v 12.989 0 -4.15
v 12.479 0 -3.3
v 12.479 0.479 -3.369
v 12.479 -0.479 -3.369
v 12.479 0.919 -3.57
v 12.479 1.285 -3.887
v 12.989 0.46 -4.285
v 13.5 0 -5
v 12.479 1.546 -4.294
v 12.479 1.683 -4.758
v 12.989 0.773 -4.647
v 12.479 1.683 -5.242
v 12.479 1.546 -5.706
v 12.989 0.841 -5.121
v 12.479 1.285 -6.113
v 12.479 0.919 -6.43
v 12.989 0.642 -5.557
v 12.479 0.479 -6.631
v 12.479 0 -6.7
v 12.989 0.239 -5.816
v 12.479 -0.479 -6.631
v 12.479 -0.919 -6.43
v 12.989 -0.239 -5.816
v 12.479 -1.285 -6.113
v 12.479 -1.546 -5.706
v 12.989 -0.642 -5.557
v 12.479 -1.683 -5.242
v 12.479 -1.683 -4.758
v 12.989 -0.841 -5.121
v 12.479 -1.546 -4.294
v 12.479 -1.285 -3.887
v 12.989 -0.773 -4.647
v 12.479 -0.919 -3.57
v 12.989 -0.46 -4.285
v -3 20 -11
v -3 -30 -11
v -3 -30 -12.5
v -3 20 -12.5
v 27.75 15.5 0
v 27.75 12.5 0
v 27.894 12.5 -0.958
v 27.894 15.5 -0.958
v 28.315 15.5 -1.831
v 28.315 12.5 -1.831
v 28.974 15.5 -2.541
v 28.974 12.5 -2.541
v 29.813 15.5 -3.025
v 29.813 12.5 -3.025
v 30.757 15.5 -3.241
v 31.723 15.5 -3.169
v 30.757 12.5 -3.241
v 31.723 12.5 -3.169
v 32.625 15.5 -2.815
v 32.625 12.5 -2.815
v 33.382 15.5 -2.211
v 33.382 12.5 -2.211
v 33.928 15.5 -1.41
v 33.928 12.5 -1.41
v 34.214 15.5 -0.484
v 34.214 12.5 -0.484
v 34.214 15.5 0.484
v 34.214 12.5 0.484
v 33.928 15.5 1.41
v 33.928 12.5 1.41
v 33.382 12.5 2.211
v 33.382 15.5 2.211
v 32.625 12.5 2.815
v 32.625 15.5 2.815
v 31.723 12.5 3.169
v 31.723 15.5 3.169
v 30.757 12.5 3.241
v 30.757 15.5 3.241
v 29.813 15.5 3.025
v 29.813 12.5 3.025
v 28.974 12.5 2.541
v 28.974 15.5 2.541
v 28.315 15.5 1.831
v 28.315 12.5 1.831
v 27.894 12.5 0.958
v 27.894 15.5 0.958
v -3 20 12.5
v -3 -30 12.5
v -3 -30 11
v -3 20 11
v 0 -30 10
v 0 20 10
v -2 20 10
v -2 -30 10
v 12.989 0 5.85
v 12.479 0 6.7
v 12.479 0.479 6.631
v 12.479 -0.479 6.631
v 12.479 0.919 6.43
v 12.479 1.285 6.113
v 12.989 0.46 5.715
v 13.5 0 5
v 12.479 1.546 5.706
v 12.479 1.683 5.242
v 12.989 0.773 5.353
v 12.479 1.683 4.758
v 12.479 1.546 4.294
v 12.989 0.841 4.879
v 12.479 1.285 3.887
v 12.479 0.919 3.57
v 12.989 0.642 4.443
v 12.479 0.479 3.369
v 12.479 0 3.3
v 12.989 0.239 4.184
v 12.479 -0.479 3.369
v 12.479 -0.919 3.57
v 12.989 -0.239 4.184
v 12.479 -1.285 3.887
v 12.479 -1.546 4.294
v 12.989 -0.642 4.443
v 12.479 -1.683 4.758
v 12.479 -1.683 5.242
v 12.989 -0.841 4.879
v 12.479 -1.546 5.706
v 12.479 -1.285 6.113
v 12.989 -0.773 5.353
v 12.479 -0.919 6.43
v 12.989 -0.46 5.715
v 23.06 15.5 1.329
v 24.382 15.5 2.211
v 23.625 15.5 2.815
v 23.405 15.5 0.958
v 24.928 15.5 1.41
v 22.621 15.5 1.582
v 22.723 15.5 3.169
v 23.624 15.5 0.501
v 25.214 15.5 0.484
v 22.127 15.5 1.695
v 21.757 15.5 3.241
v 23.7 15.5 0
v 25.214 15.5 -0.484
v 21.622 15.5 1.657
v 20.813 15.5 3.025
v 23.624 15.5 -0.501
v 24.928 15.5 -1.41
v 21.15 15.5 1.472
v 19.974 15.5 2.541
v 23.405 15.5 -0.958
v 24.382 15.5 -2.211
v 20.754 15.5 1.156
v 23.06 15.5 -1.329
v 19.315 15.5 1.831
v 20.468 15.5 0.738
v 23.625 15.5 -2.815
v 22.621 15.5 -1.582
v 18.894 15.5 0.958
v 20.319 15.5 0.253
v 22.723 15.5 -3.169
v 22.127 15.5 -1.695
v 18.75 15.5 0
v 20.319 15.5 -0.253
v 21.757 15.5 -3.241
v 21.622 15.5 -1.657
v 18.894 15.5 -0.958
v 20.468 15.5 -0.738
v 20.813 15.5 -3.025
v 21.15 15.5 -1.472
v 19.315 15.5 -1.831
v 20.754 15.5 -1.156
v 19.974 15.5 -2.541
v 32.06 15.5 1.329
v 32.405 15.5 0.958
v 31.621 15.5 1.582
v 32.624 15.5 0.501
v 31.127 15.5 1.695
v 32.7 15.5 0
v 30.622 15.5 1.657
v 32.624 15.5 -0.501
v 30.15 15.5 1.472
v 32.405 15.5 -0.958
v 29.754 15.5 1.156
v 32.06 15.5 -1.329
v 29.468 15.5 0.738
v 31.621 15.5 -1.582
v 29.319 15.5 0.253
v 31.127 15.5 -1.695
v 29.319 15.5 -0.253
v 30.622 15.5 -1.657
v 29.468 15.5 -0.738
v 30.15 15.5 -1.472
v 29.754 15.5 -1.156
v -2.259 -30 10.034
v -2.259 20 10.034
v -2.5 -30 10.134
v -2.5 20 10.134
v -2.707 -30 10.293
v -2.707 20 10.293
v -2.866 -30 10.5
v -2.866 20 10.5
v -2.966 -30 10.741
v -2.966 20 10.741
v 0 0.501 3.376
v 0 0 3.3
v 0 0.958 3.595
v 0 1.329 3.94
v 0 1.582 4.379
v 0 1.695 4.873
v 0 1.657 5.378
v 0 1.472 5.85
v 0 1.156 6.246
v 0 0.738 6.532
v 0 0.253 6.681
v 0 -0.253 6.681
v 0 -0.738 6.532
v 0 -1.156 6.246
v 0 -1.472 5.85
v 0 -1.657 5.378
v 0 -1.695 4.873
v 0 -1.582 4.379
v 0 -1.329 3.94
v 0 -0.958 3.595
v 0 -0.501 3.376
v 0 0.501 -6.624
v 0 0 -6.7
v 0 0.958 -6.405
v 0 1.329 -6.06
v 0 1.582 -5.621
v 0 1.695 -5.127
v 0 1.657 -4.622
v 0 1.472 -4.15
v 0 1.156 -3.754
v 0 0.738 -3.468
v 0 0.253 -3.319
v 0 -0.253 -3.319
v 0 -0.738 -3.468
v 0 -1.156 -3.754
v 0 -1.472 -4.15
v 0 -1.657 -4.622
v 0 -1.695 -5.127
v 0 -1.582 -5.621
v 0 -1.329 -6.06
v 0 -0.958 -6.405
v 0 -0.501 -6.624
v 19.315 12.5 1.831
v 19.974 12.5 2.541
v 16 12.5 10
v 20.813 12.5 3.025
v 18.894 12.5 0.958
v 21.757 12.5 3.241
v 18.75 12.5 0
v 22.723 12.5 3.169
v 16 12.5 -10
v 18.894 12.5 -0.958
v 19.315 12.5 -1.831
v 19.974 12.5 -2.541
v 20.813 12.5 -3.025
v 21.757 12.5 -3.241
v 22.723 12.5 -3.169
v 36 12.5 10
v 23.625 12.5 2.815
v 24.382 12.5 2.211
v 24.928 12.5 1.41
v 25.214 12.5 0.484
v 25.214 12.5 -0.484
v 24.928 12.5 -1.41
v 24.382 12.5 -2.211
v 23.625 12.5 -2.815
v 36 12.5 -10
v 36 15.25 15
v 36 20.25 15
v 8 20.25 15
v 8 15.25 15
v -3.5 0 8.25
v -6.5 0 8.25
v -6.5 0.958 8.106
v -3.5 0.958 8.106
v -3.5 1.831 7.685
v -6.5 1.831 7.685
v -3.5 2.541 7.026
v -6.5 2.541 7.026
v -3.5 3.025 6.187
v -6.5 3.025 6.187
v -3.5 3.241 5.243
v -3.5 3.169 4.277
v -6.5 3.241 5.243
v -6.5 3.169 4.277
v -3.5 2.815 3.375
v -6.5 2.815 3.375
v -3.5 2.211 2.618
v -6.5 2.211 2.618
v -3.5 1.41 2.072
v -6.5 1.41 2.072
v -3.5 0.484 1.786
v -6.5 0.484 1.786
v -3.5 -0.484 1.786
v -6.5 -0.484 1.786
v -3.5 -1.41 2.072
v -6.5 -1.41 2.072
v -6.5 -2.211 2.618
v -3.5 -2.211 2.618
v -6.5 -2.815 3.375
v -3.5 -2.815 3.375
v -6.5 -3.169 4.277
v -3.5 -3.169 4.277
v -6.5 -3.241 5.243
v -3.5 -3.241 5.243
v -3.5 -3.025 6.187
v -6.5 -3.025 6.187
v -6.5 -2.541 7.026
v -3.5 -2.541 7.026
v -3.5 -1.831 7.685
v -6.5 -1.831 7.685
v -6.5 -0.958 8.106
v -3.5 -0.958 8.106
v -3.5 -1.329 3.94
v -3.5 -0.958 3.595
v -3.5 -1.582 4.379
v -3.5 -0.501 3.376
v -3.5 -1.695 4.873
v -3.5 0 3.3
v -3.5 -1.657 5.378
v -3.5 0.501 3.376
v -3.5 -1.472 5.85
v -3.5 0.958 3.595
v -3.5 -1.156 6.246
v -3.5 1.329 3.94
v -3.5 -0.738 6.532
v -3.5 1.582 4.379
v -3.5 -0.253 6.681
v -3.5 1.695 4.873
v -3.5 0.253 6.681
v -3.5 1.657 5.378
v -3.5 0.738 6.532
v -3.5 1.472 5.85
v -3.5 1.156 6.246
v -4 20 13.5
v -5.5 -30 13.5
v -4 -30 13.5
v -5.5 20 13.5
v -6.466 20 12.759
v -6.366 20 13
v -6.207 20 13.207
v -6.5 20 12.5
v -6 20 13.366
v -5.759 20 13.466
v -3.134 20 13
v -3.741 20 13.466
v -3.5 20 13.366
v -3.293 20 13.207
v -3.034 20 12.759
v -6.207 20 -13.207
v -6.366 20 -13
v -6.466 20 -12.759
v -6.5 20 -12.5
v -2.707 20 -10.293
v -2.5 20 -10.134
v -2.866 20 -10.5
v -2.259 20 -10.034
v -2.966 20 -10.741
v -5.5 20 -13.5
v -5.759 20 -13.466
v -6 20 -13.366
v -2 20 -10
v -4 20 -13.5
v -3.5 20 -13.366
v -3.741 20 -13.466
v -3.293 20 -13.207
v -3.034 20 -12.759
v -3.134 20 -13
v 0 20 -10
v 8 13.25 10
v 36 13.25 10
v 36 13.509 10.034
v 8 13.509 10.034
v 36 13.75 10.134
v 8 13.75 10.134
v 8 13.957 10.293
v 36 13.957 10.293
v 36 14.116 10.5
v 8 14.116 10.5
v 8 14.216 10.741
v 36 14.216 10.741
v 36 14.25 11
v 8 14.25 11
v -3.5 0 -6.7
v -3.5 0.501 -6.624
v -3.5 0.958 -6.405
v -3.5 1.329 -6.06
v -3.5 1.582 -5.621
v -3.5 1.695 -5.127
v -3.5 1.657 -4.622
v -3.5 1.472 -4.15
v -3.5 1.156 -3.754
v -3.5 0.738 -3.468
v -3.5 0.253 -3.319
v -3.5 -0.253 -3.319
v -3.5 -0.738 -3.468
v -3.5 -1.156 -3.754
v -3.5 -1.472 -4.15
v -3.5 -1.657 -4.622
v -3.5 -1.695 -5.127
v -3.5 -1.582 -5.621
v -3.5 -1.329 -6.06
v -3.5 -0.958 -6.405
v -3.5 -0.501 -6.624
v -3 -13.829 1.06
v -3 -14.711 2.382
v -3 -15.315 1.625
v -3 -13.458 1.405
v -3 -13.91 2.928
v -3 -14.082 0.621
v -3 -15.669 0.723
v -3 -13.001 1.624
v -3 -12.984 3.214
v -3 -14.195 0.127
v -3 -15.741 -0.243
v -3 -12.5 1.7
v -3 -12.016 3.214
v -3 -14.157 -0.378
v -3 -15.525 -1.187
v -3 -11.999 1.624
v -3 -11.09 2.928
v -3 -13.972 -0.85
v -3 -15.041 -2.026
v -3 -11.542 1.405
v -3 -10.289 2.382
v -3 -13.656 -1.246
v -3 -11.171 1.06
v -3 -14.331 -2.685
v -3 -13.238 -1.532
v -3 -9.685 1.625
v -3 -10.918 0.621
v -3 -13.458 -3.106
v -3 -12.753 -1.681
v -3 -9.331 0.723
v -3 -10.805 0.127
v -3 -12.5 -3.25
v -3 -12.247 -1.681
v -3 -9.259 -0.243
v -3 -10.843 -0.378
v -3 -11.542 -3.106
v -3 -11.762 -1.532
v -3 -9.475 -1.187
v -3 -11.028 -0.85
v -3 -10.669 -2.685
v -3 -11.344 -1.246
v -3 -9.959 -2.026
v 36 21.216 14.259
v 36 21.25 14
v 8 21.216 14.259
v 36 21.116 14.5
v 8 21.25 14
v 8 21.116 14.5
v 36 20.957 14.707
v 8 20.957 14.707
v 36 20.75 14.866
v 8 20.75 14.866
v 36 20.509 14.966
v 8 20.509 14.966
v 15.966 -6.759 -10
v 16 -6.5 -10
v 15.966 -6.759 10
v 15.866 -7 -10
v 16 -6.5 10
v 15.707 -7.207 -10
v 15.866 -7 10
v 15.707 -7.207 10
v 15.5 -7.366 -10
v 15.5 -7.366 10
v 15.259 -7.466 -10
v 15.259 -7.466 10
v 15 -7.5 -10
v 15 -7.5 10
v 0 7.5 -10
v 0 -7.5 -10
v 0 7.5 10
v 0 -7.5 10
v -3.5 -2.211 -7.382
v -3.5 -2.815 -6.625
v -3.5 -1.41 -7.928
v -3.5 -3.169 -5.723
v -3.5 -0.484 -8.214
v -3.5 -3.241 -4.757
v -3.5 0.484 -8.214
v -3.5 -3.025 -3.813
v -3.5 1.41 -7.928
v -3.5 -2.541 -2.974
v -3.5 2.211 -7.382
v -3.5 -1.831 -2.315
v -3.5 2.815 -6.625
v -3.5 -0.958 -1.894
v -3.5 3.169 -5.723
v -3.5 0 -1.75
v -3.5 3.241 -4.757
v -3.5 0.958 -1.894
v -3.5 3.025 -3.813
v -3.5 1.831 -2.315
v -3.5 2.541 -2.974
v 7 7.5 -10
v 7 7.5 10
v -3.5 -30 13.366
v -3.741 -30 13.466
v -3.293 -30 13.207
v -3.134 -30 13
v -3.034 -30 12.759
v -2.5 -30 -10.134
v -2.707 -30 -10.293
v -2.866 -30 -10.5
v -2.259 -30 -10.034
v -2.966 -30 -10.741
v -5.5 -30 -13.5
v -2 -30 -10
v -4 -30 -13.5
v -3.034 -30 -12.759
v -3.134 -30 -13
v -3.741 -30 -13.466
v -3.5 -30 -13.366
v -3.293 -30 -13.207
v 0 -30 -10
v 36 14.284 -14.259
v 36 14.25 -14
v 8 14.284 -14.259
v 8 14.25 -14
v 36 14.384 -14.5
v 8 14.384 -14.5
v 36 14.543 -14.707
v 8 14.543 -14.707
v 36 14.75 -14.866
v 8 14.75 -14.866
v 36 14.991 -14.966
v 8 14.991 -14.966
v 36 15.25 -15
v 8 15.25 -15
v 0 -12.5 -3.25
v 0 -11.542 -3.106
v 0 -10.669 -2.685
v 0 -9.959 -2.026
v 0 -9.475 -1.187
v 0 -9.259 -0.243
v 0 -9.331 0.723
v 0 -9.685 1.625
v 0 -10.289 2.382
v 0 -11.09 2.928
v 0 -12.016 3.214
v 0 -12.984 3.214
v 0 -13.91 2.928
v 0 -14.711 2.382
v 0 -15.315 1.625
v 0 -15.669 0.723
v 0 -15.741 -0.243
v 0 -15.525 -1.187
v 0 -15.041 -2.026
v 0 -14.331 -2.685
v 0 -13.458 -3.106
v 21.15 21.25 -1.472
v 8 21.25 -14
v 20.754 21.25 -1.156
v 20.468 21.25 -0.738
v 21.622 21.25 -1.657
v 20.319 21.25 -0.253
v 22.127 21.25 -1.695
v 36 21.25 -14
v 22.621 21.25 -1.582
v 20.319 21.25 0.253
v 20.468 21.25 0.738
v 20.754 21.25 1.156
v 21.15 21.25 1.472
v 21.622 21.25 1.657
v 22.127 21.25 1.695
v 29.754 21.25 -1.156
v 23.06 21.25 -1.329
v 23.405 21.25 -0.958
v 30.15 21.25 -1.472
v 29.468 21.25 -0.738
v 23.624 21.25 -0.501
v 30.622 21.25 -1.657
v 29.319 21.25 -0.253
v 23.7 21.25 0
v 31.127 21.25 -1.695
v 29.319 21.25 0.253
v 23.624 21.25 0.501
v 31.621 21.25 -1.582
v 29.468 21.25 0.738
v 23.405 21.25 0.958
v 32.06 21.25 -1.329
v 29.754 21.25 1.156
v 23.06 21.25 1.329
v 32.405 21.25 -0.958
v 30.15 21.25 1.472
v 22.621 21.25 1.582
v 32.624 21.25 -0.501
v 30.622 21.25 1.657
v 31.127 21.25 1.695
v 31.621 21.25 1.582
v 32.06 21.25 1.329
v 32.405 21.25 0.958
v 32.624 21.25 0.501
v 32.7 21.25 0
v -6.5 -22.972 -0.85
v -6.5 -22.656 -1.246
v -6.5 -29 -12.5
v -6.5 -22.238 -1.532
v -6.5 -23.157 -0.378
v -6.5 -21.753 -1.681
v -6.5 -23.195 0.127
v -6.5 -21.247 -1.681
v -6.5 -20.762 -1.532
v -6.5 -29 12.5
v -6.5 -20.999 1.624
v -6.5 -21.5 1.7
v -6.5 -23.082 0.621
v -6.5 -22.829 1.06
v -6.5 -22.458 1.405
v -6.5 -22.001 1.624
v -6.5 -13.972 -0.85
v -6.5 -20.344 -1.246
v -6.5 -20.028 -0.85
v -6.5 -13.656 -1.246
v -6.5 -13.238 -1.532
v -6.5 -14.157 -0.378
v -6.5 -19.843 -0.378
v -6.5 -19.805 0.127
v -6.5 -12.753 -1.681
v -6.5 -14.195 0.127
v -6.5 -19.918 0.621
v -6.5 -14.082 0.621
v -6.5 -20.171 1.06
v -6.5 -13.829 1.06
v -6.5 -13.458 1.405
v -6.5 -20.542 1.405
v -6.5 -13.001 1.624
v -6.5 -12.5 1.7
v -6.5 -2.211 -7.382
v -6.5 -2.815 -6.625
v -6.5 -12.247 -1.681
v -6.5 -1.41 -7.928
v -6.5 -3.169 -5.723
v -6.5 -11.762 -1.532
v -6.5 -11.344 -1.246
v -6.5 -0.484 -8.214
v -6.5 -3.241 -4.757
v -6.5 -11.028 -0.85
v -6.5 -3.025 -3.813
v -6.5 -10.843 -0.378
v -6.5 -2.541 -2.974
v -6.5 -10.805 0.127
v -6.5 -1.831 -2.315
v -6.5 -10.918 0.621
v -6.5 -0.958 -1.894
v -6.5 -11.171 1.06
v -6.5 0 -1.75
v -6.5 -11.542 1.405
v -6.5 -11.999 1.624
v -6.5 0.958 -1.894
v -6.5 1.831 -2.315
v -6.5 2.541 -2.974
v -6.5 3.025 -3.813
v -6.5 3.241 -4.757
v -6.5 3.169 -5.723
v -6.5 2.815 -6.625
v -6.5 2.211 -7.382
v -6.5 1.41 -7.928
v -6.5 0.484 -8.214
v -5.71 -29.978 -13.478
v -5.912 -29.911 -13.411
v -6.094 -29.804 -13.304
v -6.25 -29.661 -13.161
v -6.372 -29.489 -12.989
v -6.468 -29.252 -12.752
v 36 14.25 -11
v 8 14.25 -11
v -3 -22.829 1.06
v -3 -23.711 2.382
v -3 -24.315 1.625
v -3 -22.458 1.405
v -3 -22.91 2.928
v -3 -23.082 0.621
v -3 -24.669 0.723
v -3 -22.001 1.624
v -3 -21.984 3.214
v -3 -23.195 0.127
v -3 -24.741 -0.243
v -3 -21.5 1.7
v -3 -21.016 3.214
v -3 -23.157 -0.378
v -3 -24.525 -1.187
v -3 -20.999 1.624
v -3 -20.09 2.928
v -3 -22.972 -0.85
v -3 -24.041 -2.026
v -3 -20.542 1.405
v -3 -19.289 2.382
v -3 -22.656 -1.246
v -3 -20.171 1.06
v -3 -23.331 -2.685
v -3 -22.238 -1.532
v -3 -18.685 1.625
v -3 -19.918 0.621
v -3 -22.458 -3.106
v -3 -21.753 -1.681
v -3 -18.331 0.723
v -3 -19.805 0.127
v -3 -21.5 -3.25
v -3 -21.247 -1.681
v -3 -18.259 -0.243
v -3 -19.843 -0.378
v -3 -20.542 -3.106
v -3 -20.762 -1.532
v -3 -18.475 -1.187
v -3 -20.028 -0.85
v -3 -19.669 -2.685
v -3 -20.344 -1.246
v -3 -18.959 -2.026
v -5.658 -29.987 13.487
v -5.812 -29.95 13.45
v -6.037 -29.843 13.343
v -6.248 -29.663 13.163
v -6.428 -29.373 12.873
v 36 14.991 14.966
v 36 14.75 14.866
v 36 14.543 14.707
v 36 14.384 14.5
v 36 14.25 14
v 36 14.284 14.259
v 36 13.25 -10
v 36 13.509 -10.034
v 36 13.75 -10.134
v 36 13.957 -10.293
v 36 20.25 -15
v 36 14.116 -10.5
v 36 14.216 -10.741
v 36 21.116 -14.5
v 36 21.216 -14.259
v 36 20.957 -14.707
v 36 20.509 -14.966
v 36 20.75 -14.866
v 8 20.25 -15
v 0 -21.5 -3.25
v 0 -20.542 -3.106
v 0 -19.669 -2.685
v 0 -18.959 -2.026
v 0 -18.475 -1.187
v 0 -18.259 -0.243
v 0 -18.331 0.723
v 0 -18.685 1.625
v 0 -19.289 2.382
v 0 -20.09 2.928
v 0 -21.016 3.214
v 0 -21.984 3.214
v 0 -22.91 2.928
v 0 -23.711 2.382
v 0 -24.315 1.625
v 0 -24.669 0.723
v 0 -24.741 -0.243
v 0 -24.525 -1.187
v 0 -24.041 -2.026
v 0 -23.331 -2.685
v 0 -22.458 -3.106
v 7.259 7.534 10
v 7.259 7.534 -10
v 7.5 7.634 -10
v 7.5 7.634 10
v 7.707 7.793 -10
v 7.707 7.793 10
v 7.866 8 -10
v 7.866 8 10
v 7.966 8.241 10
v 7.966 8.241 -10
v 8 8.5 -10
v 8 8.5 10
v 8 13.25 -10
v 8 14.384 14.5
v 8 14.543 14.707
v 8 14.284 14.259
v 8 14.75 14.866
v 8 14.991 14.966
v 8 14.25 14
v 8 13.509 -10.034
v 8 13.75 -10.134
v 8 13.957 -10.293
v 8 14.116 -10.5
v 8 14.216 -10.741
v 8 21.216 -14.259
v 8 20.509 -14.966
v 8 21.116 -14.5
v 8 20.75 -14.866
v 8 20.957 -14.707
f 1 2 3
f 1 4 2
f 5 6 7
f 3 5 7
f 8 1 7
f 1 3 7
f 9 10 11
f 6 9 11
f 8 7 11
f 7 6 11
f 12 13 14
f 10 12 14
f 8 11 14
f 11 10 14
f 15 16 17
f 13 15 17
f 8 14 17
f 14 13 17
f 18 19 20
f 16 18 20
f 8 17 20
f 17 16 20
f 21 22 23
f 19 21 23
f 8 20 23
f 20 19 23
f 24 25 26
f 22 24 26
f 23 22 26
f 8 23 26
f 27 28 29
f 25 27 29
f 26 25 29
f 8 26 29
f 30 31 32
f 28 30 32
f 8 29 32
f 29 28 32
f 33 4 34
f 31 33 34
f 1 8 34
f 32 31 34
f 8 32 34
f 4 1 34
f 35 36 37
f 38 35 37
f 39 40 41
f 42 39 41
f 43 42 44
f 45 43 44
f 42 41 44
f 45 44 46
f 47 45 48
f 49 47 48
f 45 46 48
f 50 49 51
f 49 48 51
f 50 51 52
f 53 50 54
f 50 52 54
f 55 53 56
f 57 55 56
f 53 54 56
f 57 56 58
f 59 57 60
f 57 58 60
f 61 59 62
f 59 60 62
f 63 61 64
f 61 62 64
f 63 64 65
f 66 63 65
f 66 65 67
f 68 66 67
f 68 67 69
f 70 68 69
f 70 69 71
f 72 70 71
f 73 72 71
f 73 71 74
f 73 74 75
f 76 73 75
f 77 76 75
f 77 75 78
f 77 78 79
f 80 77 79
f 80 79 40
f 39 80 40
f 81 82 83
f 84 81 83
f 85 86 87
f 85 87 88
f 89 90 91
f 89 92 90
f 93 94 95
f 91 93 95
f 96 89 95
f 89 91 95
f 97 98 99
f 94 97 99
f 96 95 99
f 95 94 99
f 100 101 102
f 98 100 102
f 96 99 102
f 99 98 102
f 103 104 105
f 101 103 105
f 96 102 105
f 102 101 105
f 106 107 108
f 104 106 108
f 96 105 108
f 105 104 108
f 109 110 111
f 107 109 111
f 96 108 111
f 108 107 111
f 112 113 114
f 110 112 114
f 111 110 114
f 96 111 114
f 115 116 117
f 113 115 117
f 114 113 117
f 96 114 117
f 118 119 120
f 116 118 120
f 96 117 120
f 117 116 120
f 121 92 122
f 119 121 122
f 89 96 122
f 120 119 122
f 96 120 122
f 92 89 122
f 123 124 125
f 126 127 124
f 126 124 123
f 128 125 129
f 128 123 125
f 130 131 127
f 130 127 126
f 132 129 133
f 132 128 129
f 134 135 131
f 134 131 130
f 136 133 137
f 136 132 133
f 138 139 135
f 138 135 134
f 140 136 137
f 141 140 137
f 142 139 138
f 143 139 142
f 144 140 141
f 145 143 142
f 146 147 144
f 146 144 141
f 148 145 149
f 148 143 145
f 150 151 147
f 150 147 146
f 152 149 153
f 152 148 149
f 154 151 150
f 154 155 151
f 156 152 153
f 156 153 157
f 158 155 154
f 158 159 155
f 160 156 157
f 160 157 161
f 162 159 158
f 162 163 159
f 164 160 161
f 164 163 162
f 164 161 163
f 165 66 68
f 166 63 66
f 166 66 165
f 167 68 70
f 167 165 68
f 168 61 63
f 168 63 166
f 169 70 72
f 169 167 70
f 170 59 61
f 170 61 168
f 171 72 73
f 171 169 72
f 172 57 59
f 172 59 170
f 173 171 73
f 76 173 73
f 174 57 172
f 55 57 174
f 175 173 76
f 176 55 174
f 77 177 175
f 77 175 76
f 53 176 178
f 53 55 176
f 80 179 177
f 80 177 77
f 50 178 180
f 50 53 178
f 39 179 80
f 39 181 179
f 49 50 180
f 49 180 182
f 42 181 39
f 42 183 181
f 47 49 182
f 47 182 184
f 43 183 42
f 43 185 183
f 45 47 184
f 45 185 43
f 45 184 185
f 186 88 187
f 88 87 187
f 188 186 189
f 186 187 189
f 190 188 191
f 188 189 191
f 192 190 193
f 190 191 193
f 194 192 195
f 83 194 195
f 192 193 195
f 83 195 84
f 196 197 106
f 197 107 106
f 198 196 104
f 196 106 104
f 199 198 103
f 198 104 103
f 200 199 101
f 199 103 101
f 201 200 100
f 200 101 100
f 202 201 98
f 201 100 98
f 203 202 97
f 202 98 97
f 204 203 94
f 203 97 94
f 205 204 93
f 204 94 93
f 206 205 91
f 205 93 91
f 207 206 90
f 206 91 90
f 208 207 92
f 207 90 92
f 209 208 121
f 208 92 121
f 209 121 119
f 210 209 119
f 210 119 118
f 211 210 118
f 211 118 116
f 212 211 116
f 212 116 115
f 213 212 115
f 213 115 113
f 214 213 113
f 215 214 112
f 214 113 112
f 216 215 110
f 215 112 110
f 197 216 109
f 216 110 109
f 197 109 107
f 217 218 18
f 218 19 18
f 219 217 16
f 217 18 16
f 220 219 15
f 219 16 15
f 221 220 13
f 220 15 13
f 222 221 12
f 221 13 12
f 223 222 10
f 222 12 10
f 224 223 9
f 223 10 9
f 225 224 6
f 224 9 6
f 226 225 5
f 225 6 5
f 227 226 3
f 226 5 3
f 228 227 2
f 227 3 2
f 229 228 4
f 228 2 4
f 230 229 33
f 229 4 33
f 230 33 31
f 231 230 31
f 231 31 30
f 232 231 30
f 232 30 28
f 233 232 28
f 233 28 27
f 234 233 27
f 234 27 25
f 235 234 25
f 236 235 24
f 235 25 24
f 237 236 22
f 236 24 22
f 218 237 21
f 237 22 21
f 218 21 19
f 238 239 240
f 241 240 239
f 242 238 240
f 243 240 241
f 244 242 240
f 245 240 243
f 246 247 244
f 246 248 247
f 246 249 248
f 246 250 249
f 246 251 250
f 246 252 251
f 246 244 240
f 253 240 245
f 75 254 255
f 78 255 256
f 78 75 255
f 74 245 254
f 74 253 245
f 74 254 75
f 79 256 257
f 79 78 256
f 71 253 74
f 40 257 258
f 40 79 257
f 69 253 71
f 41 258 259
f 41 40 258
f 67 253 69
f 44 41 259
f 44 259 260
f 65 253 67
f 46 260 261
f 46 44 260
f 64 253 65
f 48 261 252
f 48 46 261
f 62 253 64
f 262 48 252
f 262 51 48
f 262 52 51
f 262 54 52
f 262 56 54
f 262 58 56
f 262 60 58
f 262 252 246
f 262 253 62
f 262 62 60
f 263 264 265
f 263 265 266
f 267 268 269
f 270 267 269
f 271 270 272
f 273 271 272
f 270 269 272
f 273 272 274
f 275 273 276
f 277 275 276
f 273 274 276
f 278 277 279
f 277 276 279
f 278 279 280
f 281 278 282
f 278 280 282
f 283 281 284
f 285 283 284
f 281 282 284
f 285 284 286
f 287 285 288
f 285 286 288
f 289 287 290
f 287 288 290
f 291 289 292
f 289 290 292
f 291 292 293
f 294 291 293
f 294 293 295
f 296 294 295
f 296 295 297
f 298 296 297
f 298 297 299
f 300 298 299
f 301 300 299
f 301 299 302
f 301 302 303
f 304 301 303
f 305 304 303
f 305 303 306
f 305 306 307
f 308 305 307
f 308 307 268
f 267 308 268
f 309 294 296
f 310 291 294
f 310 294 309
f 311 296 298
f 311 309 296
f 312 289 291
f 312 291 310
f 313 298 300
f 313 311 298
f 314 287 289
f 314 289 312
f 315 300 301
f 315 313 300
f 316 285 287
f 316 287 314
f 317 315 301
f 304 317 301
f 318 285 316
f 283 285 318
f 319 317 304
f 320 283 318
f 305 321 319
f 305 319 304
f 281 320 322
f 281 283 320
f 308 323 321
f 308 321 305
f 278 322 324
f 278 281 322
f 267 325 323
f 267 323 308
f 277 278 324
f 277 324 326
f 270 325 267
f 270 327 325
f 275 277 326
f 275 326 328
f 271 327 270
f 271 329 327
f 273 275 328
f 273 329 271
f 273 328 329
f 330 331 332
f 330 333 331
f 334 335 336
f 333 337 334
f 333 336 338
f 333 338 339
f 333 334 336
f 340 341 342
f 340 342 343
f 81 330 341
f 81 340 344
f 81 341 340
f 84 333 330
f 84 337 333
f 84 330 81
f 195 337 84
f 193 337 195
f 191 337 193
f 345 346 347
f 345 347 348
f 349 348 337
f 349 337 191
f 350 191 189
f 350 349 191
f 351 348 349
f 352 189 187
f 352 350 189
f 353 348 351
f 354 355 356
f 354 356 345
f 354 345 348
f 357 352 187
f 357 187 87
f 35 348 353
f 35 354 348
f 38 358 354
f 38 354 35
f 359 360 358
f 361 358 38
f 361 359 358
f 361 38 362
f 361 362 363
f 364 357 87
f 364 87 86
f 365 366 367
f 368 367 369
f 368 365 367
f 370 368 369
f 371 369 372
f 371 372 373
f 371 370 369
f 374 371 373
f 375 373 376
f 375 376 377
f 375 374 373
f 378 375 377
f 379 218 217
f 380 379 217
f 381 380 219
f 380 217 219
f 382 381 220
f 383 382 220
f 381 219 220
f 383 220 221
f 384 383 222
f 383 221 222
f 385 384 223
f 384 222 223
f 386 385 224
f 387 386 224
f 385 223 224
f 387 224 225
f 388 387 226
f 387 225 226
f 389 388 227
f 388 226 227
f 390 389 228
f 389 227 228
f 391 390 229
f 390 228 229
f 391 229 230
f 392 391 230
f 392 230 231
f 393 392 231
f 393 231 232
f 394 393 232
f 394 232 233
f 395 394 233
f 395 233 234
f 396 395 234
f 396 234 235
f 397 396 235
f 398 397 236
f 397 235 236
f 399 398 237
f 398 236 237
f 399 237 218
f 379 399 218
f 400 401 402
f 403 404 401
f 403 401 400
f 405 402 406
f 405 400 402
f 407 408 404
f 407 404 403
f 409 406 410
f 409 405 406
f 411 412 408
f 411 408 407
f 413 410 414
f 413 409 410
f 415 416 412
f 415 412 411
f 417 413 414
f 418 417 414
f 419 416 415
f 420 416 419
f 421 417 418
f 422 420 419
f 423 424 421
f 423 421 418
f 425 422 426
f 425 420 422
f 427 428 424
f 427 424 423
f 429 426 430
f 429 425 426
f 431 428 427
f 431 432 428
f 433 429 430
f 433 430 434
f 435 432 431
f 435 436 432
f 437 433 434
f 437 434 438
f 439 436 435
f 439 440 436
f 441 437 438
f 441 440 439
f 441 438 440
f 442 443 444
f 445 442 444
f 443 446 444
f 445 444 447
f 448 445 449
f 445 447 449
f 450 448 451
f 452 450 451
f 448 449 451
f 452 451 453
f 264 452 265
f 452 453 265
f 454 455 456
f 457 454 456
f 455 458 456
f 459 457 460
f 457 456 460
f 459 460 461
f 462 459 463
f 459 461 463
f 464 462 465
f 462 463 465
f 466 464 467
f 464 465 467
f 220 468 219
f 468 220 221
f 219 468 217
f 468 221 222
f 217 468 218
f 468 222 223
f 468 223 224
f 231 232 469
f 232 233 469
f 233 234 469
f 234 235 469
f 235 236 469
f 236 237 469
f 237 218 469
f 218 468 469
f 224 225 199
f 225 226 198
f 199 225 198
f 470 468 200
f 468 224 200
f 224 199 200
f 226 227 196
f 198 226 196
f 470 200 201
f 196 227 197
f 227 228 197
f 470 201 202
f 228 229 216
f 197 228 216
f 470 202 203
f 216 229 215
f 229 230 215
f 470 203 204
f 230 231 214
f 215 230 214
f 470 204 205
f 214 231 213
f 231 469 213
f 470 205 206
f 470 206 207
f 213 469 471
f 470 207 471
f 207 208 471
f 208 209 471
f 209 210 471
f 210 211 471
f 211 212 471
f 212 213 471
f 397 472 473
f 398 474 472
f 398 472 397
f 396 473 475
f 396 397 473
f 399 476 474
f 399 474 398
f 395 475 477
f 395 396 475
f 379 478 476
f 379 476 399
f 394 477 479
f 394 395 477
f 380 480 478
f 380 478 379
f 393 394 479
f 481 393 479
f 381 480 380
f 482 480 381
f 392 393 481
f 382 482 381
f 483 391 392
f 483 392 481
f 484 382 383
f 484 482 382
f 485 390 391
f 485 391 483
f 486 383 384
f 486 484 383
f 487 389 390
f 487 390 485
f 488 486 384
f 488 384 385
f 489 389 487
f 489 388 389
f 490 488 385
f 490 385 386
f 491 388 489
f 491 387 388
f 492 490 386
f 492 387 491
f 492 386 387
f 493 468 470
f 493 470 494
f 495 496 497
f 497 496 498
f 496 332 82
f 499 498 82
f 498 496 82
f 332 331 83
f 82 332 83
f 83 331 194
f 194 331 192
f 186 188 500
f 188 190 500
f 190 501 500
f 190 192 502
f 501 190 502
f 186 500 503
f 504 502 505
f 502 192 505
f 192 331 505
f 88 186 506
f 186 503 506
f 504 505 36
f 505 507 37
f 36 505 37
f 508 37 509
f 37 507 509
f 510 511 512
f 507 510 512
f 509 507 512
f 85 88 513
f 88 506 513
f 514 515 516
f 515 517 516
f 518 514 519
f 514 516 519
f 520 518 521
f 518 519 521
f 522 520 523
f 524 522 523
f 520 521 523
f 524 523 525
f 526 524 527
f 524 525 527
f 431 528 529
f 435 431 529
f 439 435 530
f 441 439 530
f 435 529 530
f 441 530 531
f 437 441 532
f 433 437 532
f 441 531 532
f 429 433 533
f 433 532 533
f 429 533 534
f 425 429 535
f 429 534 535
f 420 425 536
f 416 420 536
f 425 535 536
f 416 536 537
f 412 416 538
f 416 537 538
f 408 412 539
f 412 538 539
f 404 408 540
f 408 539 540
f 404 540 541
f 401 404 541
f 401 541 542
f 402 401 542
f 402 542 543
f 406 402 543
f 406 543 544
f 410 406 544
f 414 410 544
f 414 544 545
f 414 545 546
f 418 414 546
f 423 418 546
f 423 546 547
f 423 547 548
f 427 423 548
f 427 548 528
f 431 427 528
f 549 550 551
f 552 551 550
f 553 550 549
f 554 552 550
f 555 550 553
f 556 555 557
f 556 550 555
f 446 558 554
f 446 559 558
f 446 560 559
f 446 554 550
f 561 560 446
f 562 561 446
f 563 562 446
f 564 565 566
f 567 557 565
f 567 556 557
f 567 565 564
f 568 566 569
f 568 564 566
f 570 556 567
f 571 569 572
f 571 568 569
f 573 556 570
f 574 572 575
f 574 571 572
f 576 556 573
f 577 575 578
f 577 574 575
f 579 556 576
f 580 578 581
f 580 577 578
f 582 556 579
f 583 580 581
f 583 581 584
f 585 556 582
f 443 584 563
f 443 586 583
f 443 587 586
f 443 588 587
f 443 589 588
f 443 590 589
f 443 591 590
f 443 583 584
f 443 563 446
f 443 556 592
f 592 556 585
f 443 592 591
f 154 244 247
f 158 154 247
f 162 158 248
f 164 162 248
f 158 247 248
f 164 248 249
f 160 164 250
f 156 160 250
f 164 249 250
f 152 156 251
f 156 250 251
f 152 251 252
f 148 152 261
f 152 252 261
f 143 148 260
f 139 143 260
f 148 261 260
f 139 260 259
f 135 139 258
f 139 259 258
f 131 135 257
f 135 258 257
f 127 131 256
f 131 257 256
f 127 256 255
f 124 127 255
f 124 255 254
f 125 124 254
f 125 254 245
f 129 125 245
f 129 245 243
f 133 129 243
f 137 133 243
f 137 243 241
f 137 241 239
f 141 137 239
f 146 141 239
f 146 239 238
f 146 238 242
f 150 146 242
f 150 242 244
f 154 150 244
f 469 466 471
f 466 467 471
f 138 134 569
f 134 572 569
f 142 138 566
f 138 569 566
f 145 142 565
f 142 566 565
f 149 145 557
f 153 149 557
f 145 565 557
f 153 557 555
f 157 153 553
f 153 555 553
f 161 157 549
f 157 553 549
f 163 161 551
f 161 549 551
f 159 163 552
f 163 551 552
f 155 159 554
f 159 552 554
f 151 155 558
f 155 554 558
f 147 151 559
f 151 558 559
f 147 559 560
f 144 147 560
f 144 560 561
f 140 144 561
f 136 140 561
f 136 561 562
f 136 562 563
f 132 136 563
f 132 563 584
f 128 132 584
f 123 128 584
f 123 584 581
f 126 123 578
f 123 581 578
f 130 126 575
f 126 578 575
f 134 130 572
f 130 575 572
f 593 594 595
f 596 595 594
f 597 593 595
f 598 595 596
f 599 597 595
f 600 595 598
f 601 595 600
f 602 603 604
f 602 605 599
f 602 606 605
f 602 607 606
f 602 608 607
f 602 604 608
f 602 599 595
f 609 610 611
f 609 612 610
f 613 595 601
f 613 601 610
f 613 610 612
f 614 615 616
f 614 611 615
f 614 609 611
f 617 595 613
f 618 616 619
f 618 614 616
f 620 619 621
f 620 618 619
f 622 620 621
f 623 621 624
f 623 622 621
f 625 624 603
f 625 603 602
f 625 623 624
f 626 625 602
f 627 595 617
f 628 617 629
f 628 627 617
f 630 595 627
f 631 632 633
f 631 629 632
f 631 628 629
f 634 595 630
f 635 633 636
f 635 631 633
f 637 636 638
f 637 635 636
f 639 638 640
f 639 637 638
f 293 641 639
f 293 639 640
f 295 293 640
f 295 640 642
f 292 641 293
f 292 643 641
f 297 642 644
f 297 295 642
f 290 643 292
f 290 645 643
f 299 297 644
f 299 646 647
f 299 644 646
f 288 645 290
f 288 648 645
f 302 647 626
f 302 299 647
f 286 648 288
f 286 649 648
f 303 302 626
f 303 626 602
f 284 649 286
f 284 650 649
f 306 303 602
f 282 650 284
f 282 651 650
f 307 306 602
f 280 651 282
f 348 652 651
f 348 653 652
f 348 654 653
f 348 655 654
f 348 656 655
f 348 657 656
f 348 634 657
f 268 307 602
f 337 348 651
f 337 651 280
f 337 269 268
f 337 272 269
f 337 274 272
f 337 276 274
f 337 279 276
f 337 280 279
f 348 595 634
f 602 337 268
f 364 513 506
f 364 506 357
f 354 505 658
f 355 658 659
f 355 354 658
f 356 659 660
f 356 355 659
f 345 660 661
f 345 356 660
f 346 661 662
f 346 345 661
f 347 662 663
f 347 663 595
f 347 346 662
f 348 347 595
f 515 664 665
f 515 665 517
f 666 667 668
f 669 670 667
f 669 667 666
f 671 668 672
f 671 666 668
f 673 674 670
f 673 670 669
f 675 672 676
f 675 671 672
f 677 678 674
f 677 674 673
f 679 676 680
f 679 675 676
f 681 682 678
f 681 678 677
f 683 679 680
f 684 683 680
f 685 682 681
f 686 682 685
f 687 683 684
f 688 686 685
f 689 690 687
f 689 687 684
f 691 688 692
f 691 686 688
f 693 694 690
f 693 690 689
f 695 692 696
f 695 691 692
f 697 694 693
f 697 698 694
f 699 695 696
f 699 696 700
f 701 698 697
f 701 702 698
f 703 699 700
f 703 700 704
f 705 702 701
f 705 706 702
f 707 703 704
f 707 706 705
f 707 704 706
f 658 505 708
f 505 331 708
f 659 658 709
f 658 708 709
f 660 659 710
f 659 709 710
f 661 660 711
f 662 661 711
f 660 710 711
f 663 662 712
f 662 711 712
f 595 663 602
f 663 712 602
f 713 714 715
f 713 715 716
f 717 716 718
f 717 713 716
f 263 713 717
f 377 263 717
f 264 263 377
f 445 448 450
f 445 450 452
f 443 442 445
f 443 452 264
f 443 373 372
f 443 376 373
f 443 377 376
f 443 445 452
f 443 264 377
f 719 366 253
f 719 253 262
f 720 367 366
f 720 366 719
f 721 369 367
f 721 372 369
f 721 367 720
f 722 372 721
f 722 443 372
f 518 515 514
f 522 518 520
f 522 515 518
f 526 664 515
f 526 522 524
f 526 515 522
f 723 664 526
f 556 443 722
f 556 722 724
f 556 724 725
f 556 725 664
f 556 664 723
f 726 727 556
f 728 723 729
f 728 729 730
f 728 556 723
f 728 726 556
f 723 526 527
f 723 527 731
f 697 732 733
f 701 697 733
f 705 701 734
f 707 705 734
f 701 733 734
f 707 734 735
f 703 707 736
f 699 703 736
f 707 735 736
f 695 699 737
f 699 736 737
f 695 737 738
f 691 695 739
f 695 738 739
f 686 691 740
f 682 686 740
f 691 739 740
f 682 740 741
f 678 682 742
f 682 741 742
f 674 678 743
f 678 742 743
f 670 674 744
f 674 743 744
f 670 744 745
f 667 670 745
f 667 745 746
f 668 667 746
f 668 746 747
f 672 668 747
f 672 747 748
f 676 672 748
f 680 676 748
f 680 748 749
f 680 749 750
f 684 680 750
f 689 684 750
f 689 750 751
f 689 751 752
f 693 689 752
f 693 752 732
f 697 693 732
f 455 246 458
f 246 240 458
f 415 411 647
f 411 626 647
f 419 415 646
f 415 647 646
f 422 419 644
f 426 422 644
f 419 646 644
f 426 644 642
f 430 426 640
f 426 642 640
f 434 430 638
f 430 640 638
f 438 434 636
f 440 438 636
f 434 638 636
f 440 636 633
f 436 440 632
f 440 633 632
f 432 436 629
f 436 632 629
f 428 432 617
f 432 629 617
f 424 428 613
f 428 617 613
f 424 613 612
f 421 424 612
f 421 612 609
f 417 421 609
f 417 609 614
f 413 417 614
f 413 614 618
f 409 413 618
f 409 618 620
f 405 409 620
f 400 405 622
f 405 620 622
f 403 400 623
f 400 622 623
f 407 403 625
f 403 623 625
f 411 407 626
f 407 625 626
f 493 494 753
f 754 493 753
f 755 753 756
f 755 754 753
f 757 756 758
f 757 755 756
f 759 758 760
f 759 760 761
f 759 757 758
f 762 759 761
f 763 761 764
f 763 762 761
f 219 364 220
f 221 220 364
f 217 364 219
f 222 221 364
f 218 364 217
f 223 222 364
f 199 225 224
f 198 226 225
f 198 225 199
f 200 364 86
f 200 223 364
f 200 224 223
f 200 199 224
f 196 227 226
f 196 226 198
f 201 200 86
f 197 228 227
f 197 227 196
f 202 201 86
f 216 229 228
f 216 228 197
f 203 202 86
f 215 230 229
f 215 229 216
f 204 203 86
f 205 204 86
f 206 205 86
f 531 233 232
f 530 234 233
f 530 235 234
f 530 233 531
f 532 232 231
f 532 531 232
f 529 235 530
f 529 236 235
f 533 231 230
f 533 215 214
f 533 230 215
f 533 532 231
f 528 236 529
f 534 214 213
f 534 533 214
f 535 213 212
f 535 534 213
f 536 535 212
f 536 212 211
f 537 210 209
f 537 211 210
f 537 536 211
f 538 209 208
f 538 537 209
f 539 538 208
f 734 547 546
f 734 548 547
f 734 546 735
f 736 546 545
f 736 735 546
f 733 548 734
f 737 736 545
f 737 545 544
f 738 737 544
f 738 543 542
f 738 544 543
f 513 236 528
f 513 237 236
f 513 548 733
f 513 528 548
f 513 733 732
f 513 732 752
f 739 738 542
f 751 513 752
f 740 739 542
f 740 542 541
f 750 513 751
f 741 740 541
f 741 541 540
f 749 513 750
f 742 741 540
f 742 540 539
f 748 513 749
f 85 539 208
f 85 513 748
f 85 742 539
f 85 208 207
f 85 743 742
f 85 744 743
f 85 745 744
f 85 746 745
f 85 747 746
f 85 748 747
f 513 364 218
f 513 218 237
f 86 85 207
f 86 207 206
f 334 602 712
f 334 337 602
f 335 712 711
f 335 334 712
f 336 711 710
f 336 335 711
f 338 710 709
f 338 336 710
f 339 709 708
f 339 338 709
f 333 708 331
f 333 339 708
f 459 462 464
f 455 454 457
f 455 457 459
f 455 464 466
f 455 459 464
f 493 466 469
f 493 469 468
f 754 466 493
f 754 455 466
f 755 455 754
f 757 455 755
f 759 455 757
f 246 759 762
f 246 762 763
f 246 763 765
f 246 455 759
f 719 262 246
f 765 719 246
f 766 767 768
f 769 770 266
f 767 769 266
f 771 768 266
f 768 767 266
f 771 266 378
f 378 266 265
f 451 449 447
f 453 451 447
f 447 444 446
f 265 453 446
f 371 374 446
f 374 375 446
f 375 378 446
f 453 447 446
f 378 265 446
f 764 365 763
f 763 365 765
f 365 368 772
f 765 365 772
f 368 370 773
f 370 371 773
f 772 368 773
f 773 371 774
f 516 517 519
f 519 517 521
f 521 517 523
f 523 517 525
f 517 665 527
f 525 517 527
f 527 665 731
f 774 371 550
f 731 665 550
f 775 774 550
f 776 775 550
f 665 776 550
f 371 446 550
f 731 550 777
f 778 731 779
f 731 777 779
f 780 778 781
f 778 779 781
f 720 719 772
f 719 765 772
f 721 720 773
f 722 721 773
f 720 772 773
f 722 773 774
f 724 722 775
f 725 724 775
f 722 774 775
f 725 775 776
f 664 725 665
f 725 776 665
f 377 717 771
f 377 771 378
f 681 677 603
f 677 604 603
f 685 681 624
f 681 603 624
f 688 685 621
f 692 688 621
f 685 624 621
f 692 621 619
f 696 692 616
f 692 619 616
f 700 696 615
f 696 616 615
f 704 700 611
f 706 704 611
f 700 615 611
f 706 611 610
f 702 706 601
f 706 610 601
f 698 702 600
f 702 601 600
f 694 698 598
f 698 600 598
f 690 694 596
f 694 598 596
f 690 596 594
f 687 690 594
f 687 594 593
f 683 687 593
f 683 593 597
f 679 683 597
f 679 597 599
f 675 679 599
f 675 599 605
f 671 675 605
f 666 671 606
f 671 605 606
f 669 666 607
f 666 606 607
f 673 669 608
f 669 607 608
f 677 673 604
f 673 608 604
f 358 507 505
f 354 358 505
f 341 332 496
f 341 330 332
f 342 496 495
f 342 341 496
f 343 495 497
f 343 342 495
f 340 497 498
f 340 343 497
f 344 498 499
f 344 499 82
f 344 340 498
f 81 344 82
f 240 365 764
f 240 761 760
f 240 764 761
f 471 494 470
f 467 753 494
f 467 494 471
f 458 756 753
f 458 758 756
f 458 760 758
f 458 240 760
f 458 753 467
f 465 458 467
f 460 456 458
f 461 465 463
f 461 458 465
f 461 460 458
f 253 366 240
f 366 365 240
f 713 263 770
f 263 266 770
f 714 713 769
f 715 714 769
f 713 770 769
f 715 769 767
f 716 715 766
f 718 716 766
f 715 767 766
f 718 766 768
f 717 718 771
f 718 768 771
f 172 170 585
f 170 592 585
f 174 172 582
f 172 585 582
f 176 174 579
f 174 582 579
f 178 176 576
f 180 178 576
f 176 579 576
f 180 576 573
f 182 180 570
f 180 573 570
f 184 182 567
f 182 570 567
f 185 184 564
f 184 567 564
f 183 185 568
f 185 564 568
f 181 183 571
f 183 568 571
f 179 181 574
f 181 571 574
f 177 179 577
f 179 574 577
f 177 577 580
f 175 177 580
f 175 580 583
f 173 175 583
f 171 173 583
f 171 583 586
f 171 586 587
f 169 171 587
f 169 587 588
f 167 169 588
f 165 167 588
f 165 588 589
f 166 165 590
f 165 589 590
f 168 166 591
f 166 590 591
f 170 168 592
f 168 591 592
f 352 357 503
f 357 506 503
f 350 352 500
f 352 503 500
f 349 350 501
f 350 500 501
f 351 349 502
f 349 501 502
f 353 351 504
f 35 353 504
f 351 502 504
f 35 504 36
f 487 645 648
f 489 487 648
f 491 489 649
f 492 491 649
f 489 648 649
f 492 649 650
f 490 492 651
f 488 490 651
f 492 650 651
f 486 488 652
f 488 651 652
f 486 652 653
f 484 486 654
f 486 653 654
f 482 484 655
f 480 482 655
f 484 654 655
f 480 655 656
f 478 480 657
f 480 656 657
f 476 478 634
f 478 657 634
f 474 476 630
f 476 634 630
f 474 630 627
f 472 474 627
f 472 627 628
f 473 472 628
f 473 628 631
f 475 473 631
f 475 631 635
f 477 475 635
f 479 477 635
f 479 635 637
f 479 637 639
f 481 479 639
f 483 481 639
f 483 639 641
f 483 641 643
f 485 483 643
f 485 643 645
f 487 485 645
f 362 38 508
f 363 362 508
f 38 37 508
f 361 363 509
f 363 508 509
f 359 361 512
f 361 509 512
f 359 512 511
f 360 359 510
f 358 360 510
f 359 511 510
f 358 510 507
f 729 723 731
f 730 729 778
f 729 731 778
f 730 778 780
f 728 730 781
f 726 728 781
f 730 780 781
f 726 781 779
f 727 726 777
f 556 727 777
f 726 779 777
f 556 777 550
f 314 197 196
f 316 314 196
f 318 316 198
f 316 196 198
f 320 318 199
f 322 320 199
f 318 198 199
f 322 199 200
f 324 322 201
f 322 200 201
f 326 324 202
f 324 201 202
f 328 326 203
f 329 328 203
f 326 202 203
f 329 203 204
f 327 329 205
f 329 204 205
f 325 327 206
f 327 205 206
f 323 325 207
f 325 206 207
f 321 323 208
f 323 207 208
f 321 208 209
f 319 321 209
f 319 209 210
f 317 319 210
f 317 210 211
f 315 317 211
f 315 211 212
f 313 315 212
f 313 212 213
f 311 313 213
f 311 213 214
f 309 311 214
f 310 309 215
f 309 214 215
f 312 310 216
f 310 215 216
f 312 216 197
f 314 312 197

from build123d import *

# Parameters (mm, degrees)
BOSS_EXTRUDE1_DEPTH             = 10
BOSS_EXTRUDE2_DEPTH             = 20
BOSS_EXTRUDE2_DEPTH_BACK        = 30
BOSS_EXTRUDE4_START             = -28
BOSS_EXTRUDE4_DEPTH             = 28
CBORE_FOR_M3_SHCS10_D           = 3.4
CBORE_FOR_M3_SHCS10_CBORE_D     = 6.5
CBORE_FOR_M3_SHCS10_CBORE_DEPTH = 3
CBORE_FOR_M3_SHCS11_D           = 3.4
CBORE_FOR_M3_SHCS11_CBORE_D     = 6.5
CBORE_FOR_M3_SHCS11_CBORE_DEPTH = 3
CBORE_FOR_M3_SHCS13_D           = 3.4
CBORE_FOR_M3_SHCS13_DEPTH       = 18.978536948
CBORE_FOR_M3_SHCS13_CBORE_D     = 6.5
CBORE_FOR_M3_SHCS13_CBORE_DEPTH = 3
CBORE_FOR_M3_SHCS13_TIP         = 1.021463052
FILLET1_R                       = 1


with BuildPart() as part:
    # Sketch1 → Boss-Extrude1 (new body, symmetric)
    with BuildSketch(Plane.XY):
        Polygon((16, -7.5), (0, -7.5), (0, 7.5), (8, 7.5), (8, 12.5), (16, 12.5), align=None)
    extrude(amount=BOSS_EXTRUDE1_DEPTH, both=True)

    # Sketch2 → Boss-Extrude2 (add, two sides)
    with BuildSketch(Plane(origin=(0, 0, 0), x_dir=(1, 0, 0), z_dir=(0, 1, 0))) as boss_extrude2_sk:
        Polygon((-3, 13.5), (-6.5, 13.5), (-6.5, -13.5), (-3, -13.5), (-3, -10), (0, -10), (0, 10), (-3, 10), align=None)
    extrude(amount=BOSS_EXTRUDE2_DEPTH)
    extrude(boss_extrude2_sk.sketch, amount=-BOSS_EXTRUDE2_DEPTH_BACK)

    # Sketch7 → Boss-Extrude4 (add)
    with BuildSketch(Plane.ZY.offset(-8).offset(BOSS_EXTRUDE4_START)):
        Polygon((-10, 12.5), (-10, 14.25), (-15, 14.25), (-15, 21.25), (15, 21.25), (15, 14.25), (10, 14.25), (10, 12.5), align=None)
    extrude(amount=BOSS_EXTRUDE4_DEPTH)

    # CBORE for M3 SHCS10 (through all)
    with Locations(Plane(origin=(0, 12.5, 0), x_dir=(-1, 0, 0), z_dir=(0, -1, 0))):
        with Locations((-22, 0), (-31, 0)):
            CounterBoreHole(CBORE_FOR_M3_SHCS10_D / 2, CBORE_FOR_M3_SHCS10_CBORE_D / 2, CBORE_FOR_M3_SHCS10_CBORE_DEPTH)

    # CBORE for M3 SHCS11 (through all)
    with Locations(Plane(origin=(0, 0, 0), x_dir=(0, 0, -1), z_dir=(1, 0, 0))):
        with Locations((0, -12.5), (0, -21.5)):
            CounterBoreHole(CBORE_FOR_M3_SHCS11_D / 2, CBORE_FOR_M3_SHCS11_CBORE_D / 2, CBORE_FOR_M3_SHCS11_CBORE_DEPTH)

    # CBORE for M3 SHCS13
    with Locations(Plane.ZY.offset(6.5)):
        with Locations((-5, 0), (5, 0)):
            CounterBoreHole(CBORE_FOR_M3_SHCS13_D / 2, CBORE_FOR_M3_SHCS13_CBORE_D / 2, CBORE_FOR_M3_SHCS13_CBORE_DEPTH, depth=CBORE_FOR_M3_SHCS13_DEPTH)
            with Locations((0, 0, -(CBORE_FOR_M3_SHCS13_DEPTH + CBORE_FOR_M3_SHCS13_TIP / 2))):  # 118° drill point
                Cone(0, CBORE_FOR_M3_SHCS13_D / 2, CBORE_FOR_M3_SHCS13_TIP, mode=Mode.SUBTRACT)

    # Fillet1
    fillet1_edges = [part.edges().sort_by_distance(p)[0] for p in [
        (16, -7.5, 0),
        (8, 7.5, 0),
        (-3, -5, -13.5),
        (-3, -5, -10),
        (-3, -5, 10),
        (-3, -5, 13.5),
        (-6.5, -5, 13.5),
        (-6.5, -30, 0),
        (-6.5, -5, -13.5),
        (22, 14.25, -10),
        (22, 14.25, -15),
        (22, 21.25, -15),
        (22, 21.25, 15),
        (22, 14.25, 15),
        (22, 14.25, 10),
    ]]
    fillet(fillet1_edges, radius=FILLET1_R)


with BuildPart() as body_2:
    # Split1: the piece on the far side of the plane
    add(part.part)
    split(bisect_by=Plane(origin=(0, 0, 0), x_dir=(0, 0, 1), z_dir=(1, 0, 0)), keep=Keep.BOTTOM)


with BuildPart() as part_1:
    add(part.part)

    # Split1
    split(bisect_by=Plane(origin=(0, 0, 0), x_dir=(0, 0, 1), z_dir=(1, 0, 0)), keep=Keep.TOP)


solid = Compound([body_2.part, part_1.part])
